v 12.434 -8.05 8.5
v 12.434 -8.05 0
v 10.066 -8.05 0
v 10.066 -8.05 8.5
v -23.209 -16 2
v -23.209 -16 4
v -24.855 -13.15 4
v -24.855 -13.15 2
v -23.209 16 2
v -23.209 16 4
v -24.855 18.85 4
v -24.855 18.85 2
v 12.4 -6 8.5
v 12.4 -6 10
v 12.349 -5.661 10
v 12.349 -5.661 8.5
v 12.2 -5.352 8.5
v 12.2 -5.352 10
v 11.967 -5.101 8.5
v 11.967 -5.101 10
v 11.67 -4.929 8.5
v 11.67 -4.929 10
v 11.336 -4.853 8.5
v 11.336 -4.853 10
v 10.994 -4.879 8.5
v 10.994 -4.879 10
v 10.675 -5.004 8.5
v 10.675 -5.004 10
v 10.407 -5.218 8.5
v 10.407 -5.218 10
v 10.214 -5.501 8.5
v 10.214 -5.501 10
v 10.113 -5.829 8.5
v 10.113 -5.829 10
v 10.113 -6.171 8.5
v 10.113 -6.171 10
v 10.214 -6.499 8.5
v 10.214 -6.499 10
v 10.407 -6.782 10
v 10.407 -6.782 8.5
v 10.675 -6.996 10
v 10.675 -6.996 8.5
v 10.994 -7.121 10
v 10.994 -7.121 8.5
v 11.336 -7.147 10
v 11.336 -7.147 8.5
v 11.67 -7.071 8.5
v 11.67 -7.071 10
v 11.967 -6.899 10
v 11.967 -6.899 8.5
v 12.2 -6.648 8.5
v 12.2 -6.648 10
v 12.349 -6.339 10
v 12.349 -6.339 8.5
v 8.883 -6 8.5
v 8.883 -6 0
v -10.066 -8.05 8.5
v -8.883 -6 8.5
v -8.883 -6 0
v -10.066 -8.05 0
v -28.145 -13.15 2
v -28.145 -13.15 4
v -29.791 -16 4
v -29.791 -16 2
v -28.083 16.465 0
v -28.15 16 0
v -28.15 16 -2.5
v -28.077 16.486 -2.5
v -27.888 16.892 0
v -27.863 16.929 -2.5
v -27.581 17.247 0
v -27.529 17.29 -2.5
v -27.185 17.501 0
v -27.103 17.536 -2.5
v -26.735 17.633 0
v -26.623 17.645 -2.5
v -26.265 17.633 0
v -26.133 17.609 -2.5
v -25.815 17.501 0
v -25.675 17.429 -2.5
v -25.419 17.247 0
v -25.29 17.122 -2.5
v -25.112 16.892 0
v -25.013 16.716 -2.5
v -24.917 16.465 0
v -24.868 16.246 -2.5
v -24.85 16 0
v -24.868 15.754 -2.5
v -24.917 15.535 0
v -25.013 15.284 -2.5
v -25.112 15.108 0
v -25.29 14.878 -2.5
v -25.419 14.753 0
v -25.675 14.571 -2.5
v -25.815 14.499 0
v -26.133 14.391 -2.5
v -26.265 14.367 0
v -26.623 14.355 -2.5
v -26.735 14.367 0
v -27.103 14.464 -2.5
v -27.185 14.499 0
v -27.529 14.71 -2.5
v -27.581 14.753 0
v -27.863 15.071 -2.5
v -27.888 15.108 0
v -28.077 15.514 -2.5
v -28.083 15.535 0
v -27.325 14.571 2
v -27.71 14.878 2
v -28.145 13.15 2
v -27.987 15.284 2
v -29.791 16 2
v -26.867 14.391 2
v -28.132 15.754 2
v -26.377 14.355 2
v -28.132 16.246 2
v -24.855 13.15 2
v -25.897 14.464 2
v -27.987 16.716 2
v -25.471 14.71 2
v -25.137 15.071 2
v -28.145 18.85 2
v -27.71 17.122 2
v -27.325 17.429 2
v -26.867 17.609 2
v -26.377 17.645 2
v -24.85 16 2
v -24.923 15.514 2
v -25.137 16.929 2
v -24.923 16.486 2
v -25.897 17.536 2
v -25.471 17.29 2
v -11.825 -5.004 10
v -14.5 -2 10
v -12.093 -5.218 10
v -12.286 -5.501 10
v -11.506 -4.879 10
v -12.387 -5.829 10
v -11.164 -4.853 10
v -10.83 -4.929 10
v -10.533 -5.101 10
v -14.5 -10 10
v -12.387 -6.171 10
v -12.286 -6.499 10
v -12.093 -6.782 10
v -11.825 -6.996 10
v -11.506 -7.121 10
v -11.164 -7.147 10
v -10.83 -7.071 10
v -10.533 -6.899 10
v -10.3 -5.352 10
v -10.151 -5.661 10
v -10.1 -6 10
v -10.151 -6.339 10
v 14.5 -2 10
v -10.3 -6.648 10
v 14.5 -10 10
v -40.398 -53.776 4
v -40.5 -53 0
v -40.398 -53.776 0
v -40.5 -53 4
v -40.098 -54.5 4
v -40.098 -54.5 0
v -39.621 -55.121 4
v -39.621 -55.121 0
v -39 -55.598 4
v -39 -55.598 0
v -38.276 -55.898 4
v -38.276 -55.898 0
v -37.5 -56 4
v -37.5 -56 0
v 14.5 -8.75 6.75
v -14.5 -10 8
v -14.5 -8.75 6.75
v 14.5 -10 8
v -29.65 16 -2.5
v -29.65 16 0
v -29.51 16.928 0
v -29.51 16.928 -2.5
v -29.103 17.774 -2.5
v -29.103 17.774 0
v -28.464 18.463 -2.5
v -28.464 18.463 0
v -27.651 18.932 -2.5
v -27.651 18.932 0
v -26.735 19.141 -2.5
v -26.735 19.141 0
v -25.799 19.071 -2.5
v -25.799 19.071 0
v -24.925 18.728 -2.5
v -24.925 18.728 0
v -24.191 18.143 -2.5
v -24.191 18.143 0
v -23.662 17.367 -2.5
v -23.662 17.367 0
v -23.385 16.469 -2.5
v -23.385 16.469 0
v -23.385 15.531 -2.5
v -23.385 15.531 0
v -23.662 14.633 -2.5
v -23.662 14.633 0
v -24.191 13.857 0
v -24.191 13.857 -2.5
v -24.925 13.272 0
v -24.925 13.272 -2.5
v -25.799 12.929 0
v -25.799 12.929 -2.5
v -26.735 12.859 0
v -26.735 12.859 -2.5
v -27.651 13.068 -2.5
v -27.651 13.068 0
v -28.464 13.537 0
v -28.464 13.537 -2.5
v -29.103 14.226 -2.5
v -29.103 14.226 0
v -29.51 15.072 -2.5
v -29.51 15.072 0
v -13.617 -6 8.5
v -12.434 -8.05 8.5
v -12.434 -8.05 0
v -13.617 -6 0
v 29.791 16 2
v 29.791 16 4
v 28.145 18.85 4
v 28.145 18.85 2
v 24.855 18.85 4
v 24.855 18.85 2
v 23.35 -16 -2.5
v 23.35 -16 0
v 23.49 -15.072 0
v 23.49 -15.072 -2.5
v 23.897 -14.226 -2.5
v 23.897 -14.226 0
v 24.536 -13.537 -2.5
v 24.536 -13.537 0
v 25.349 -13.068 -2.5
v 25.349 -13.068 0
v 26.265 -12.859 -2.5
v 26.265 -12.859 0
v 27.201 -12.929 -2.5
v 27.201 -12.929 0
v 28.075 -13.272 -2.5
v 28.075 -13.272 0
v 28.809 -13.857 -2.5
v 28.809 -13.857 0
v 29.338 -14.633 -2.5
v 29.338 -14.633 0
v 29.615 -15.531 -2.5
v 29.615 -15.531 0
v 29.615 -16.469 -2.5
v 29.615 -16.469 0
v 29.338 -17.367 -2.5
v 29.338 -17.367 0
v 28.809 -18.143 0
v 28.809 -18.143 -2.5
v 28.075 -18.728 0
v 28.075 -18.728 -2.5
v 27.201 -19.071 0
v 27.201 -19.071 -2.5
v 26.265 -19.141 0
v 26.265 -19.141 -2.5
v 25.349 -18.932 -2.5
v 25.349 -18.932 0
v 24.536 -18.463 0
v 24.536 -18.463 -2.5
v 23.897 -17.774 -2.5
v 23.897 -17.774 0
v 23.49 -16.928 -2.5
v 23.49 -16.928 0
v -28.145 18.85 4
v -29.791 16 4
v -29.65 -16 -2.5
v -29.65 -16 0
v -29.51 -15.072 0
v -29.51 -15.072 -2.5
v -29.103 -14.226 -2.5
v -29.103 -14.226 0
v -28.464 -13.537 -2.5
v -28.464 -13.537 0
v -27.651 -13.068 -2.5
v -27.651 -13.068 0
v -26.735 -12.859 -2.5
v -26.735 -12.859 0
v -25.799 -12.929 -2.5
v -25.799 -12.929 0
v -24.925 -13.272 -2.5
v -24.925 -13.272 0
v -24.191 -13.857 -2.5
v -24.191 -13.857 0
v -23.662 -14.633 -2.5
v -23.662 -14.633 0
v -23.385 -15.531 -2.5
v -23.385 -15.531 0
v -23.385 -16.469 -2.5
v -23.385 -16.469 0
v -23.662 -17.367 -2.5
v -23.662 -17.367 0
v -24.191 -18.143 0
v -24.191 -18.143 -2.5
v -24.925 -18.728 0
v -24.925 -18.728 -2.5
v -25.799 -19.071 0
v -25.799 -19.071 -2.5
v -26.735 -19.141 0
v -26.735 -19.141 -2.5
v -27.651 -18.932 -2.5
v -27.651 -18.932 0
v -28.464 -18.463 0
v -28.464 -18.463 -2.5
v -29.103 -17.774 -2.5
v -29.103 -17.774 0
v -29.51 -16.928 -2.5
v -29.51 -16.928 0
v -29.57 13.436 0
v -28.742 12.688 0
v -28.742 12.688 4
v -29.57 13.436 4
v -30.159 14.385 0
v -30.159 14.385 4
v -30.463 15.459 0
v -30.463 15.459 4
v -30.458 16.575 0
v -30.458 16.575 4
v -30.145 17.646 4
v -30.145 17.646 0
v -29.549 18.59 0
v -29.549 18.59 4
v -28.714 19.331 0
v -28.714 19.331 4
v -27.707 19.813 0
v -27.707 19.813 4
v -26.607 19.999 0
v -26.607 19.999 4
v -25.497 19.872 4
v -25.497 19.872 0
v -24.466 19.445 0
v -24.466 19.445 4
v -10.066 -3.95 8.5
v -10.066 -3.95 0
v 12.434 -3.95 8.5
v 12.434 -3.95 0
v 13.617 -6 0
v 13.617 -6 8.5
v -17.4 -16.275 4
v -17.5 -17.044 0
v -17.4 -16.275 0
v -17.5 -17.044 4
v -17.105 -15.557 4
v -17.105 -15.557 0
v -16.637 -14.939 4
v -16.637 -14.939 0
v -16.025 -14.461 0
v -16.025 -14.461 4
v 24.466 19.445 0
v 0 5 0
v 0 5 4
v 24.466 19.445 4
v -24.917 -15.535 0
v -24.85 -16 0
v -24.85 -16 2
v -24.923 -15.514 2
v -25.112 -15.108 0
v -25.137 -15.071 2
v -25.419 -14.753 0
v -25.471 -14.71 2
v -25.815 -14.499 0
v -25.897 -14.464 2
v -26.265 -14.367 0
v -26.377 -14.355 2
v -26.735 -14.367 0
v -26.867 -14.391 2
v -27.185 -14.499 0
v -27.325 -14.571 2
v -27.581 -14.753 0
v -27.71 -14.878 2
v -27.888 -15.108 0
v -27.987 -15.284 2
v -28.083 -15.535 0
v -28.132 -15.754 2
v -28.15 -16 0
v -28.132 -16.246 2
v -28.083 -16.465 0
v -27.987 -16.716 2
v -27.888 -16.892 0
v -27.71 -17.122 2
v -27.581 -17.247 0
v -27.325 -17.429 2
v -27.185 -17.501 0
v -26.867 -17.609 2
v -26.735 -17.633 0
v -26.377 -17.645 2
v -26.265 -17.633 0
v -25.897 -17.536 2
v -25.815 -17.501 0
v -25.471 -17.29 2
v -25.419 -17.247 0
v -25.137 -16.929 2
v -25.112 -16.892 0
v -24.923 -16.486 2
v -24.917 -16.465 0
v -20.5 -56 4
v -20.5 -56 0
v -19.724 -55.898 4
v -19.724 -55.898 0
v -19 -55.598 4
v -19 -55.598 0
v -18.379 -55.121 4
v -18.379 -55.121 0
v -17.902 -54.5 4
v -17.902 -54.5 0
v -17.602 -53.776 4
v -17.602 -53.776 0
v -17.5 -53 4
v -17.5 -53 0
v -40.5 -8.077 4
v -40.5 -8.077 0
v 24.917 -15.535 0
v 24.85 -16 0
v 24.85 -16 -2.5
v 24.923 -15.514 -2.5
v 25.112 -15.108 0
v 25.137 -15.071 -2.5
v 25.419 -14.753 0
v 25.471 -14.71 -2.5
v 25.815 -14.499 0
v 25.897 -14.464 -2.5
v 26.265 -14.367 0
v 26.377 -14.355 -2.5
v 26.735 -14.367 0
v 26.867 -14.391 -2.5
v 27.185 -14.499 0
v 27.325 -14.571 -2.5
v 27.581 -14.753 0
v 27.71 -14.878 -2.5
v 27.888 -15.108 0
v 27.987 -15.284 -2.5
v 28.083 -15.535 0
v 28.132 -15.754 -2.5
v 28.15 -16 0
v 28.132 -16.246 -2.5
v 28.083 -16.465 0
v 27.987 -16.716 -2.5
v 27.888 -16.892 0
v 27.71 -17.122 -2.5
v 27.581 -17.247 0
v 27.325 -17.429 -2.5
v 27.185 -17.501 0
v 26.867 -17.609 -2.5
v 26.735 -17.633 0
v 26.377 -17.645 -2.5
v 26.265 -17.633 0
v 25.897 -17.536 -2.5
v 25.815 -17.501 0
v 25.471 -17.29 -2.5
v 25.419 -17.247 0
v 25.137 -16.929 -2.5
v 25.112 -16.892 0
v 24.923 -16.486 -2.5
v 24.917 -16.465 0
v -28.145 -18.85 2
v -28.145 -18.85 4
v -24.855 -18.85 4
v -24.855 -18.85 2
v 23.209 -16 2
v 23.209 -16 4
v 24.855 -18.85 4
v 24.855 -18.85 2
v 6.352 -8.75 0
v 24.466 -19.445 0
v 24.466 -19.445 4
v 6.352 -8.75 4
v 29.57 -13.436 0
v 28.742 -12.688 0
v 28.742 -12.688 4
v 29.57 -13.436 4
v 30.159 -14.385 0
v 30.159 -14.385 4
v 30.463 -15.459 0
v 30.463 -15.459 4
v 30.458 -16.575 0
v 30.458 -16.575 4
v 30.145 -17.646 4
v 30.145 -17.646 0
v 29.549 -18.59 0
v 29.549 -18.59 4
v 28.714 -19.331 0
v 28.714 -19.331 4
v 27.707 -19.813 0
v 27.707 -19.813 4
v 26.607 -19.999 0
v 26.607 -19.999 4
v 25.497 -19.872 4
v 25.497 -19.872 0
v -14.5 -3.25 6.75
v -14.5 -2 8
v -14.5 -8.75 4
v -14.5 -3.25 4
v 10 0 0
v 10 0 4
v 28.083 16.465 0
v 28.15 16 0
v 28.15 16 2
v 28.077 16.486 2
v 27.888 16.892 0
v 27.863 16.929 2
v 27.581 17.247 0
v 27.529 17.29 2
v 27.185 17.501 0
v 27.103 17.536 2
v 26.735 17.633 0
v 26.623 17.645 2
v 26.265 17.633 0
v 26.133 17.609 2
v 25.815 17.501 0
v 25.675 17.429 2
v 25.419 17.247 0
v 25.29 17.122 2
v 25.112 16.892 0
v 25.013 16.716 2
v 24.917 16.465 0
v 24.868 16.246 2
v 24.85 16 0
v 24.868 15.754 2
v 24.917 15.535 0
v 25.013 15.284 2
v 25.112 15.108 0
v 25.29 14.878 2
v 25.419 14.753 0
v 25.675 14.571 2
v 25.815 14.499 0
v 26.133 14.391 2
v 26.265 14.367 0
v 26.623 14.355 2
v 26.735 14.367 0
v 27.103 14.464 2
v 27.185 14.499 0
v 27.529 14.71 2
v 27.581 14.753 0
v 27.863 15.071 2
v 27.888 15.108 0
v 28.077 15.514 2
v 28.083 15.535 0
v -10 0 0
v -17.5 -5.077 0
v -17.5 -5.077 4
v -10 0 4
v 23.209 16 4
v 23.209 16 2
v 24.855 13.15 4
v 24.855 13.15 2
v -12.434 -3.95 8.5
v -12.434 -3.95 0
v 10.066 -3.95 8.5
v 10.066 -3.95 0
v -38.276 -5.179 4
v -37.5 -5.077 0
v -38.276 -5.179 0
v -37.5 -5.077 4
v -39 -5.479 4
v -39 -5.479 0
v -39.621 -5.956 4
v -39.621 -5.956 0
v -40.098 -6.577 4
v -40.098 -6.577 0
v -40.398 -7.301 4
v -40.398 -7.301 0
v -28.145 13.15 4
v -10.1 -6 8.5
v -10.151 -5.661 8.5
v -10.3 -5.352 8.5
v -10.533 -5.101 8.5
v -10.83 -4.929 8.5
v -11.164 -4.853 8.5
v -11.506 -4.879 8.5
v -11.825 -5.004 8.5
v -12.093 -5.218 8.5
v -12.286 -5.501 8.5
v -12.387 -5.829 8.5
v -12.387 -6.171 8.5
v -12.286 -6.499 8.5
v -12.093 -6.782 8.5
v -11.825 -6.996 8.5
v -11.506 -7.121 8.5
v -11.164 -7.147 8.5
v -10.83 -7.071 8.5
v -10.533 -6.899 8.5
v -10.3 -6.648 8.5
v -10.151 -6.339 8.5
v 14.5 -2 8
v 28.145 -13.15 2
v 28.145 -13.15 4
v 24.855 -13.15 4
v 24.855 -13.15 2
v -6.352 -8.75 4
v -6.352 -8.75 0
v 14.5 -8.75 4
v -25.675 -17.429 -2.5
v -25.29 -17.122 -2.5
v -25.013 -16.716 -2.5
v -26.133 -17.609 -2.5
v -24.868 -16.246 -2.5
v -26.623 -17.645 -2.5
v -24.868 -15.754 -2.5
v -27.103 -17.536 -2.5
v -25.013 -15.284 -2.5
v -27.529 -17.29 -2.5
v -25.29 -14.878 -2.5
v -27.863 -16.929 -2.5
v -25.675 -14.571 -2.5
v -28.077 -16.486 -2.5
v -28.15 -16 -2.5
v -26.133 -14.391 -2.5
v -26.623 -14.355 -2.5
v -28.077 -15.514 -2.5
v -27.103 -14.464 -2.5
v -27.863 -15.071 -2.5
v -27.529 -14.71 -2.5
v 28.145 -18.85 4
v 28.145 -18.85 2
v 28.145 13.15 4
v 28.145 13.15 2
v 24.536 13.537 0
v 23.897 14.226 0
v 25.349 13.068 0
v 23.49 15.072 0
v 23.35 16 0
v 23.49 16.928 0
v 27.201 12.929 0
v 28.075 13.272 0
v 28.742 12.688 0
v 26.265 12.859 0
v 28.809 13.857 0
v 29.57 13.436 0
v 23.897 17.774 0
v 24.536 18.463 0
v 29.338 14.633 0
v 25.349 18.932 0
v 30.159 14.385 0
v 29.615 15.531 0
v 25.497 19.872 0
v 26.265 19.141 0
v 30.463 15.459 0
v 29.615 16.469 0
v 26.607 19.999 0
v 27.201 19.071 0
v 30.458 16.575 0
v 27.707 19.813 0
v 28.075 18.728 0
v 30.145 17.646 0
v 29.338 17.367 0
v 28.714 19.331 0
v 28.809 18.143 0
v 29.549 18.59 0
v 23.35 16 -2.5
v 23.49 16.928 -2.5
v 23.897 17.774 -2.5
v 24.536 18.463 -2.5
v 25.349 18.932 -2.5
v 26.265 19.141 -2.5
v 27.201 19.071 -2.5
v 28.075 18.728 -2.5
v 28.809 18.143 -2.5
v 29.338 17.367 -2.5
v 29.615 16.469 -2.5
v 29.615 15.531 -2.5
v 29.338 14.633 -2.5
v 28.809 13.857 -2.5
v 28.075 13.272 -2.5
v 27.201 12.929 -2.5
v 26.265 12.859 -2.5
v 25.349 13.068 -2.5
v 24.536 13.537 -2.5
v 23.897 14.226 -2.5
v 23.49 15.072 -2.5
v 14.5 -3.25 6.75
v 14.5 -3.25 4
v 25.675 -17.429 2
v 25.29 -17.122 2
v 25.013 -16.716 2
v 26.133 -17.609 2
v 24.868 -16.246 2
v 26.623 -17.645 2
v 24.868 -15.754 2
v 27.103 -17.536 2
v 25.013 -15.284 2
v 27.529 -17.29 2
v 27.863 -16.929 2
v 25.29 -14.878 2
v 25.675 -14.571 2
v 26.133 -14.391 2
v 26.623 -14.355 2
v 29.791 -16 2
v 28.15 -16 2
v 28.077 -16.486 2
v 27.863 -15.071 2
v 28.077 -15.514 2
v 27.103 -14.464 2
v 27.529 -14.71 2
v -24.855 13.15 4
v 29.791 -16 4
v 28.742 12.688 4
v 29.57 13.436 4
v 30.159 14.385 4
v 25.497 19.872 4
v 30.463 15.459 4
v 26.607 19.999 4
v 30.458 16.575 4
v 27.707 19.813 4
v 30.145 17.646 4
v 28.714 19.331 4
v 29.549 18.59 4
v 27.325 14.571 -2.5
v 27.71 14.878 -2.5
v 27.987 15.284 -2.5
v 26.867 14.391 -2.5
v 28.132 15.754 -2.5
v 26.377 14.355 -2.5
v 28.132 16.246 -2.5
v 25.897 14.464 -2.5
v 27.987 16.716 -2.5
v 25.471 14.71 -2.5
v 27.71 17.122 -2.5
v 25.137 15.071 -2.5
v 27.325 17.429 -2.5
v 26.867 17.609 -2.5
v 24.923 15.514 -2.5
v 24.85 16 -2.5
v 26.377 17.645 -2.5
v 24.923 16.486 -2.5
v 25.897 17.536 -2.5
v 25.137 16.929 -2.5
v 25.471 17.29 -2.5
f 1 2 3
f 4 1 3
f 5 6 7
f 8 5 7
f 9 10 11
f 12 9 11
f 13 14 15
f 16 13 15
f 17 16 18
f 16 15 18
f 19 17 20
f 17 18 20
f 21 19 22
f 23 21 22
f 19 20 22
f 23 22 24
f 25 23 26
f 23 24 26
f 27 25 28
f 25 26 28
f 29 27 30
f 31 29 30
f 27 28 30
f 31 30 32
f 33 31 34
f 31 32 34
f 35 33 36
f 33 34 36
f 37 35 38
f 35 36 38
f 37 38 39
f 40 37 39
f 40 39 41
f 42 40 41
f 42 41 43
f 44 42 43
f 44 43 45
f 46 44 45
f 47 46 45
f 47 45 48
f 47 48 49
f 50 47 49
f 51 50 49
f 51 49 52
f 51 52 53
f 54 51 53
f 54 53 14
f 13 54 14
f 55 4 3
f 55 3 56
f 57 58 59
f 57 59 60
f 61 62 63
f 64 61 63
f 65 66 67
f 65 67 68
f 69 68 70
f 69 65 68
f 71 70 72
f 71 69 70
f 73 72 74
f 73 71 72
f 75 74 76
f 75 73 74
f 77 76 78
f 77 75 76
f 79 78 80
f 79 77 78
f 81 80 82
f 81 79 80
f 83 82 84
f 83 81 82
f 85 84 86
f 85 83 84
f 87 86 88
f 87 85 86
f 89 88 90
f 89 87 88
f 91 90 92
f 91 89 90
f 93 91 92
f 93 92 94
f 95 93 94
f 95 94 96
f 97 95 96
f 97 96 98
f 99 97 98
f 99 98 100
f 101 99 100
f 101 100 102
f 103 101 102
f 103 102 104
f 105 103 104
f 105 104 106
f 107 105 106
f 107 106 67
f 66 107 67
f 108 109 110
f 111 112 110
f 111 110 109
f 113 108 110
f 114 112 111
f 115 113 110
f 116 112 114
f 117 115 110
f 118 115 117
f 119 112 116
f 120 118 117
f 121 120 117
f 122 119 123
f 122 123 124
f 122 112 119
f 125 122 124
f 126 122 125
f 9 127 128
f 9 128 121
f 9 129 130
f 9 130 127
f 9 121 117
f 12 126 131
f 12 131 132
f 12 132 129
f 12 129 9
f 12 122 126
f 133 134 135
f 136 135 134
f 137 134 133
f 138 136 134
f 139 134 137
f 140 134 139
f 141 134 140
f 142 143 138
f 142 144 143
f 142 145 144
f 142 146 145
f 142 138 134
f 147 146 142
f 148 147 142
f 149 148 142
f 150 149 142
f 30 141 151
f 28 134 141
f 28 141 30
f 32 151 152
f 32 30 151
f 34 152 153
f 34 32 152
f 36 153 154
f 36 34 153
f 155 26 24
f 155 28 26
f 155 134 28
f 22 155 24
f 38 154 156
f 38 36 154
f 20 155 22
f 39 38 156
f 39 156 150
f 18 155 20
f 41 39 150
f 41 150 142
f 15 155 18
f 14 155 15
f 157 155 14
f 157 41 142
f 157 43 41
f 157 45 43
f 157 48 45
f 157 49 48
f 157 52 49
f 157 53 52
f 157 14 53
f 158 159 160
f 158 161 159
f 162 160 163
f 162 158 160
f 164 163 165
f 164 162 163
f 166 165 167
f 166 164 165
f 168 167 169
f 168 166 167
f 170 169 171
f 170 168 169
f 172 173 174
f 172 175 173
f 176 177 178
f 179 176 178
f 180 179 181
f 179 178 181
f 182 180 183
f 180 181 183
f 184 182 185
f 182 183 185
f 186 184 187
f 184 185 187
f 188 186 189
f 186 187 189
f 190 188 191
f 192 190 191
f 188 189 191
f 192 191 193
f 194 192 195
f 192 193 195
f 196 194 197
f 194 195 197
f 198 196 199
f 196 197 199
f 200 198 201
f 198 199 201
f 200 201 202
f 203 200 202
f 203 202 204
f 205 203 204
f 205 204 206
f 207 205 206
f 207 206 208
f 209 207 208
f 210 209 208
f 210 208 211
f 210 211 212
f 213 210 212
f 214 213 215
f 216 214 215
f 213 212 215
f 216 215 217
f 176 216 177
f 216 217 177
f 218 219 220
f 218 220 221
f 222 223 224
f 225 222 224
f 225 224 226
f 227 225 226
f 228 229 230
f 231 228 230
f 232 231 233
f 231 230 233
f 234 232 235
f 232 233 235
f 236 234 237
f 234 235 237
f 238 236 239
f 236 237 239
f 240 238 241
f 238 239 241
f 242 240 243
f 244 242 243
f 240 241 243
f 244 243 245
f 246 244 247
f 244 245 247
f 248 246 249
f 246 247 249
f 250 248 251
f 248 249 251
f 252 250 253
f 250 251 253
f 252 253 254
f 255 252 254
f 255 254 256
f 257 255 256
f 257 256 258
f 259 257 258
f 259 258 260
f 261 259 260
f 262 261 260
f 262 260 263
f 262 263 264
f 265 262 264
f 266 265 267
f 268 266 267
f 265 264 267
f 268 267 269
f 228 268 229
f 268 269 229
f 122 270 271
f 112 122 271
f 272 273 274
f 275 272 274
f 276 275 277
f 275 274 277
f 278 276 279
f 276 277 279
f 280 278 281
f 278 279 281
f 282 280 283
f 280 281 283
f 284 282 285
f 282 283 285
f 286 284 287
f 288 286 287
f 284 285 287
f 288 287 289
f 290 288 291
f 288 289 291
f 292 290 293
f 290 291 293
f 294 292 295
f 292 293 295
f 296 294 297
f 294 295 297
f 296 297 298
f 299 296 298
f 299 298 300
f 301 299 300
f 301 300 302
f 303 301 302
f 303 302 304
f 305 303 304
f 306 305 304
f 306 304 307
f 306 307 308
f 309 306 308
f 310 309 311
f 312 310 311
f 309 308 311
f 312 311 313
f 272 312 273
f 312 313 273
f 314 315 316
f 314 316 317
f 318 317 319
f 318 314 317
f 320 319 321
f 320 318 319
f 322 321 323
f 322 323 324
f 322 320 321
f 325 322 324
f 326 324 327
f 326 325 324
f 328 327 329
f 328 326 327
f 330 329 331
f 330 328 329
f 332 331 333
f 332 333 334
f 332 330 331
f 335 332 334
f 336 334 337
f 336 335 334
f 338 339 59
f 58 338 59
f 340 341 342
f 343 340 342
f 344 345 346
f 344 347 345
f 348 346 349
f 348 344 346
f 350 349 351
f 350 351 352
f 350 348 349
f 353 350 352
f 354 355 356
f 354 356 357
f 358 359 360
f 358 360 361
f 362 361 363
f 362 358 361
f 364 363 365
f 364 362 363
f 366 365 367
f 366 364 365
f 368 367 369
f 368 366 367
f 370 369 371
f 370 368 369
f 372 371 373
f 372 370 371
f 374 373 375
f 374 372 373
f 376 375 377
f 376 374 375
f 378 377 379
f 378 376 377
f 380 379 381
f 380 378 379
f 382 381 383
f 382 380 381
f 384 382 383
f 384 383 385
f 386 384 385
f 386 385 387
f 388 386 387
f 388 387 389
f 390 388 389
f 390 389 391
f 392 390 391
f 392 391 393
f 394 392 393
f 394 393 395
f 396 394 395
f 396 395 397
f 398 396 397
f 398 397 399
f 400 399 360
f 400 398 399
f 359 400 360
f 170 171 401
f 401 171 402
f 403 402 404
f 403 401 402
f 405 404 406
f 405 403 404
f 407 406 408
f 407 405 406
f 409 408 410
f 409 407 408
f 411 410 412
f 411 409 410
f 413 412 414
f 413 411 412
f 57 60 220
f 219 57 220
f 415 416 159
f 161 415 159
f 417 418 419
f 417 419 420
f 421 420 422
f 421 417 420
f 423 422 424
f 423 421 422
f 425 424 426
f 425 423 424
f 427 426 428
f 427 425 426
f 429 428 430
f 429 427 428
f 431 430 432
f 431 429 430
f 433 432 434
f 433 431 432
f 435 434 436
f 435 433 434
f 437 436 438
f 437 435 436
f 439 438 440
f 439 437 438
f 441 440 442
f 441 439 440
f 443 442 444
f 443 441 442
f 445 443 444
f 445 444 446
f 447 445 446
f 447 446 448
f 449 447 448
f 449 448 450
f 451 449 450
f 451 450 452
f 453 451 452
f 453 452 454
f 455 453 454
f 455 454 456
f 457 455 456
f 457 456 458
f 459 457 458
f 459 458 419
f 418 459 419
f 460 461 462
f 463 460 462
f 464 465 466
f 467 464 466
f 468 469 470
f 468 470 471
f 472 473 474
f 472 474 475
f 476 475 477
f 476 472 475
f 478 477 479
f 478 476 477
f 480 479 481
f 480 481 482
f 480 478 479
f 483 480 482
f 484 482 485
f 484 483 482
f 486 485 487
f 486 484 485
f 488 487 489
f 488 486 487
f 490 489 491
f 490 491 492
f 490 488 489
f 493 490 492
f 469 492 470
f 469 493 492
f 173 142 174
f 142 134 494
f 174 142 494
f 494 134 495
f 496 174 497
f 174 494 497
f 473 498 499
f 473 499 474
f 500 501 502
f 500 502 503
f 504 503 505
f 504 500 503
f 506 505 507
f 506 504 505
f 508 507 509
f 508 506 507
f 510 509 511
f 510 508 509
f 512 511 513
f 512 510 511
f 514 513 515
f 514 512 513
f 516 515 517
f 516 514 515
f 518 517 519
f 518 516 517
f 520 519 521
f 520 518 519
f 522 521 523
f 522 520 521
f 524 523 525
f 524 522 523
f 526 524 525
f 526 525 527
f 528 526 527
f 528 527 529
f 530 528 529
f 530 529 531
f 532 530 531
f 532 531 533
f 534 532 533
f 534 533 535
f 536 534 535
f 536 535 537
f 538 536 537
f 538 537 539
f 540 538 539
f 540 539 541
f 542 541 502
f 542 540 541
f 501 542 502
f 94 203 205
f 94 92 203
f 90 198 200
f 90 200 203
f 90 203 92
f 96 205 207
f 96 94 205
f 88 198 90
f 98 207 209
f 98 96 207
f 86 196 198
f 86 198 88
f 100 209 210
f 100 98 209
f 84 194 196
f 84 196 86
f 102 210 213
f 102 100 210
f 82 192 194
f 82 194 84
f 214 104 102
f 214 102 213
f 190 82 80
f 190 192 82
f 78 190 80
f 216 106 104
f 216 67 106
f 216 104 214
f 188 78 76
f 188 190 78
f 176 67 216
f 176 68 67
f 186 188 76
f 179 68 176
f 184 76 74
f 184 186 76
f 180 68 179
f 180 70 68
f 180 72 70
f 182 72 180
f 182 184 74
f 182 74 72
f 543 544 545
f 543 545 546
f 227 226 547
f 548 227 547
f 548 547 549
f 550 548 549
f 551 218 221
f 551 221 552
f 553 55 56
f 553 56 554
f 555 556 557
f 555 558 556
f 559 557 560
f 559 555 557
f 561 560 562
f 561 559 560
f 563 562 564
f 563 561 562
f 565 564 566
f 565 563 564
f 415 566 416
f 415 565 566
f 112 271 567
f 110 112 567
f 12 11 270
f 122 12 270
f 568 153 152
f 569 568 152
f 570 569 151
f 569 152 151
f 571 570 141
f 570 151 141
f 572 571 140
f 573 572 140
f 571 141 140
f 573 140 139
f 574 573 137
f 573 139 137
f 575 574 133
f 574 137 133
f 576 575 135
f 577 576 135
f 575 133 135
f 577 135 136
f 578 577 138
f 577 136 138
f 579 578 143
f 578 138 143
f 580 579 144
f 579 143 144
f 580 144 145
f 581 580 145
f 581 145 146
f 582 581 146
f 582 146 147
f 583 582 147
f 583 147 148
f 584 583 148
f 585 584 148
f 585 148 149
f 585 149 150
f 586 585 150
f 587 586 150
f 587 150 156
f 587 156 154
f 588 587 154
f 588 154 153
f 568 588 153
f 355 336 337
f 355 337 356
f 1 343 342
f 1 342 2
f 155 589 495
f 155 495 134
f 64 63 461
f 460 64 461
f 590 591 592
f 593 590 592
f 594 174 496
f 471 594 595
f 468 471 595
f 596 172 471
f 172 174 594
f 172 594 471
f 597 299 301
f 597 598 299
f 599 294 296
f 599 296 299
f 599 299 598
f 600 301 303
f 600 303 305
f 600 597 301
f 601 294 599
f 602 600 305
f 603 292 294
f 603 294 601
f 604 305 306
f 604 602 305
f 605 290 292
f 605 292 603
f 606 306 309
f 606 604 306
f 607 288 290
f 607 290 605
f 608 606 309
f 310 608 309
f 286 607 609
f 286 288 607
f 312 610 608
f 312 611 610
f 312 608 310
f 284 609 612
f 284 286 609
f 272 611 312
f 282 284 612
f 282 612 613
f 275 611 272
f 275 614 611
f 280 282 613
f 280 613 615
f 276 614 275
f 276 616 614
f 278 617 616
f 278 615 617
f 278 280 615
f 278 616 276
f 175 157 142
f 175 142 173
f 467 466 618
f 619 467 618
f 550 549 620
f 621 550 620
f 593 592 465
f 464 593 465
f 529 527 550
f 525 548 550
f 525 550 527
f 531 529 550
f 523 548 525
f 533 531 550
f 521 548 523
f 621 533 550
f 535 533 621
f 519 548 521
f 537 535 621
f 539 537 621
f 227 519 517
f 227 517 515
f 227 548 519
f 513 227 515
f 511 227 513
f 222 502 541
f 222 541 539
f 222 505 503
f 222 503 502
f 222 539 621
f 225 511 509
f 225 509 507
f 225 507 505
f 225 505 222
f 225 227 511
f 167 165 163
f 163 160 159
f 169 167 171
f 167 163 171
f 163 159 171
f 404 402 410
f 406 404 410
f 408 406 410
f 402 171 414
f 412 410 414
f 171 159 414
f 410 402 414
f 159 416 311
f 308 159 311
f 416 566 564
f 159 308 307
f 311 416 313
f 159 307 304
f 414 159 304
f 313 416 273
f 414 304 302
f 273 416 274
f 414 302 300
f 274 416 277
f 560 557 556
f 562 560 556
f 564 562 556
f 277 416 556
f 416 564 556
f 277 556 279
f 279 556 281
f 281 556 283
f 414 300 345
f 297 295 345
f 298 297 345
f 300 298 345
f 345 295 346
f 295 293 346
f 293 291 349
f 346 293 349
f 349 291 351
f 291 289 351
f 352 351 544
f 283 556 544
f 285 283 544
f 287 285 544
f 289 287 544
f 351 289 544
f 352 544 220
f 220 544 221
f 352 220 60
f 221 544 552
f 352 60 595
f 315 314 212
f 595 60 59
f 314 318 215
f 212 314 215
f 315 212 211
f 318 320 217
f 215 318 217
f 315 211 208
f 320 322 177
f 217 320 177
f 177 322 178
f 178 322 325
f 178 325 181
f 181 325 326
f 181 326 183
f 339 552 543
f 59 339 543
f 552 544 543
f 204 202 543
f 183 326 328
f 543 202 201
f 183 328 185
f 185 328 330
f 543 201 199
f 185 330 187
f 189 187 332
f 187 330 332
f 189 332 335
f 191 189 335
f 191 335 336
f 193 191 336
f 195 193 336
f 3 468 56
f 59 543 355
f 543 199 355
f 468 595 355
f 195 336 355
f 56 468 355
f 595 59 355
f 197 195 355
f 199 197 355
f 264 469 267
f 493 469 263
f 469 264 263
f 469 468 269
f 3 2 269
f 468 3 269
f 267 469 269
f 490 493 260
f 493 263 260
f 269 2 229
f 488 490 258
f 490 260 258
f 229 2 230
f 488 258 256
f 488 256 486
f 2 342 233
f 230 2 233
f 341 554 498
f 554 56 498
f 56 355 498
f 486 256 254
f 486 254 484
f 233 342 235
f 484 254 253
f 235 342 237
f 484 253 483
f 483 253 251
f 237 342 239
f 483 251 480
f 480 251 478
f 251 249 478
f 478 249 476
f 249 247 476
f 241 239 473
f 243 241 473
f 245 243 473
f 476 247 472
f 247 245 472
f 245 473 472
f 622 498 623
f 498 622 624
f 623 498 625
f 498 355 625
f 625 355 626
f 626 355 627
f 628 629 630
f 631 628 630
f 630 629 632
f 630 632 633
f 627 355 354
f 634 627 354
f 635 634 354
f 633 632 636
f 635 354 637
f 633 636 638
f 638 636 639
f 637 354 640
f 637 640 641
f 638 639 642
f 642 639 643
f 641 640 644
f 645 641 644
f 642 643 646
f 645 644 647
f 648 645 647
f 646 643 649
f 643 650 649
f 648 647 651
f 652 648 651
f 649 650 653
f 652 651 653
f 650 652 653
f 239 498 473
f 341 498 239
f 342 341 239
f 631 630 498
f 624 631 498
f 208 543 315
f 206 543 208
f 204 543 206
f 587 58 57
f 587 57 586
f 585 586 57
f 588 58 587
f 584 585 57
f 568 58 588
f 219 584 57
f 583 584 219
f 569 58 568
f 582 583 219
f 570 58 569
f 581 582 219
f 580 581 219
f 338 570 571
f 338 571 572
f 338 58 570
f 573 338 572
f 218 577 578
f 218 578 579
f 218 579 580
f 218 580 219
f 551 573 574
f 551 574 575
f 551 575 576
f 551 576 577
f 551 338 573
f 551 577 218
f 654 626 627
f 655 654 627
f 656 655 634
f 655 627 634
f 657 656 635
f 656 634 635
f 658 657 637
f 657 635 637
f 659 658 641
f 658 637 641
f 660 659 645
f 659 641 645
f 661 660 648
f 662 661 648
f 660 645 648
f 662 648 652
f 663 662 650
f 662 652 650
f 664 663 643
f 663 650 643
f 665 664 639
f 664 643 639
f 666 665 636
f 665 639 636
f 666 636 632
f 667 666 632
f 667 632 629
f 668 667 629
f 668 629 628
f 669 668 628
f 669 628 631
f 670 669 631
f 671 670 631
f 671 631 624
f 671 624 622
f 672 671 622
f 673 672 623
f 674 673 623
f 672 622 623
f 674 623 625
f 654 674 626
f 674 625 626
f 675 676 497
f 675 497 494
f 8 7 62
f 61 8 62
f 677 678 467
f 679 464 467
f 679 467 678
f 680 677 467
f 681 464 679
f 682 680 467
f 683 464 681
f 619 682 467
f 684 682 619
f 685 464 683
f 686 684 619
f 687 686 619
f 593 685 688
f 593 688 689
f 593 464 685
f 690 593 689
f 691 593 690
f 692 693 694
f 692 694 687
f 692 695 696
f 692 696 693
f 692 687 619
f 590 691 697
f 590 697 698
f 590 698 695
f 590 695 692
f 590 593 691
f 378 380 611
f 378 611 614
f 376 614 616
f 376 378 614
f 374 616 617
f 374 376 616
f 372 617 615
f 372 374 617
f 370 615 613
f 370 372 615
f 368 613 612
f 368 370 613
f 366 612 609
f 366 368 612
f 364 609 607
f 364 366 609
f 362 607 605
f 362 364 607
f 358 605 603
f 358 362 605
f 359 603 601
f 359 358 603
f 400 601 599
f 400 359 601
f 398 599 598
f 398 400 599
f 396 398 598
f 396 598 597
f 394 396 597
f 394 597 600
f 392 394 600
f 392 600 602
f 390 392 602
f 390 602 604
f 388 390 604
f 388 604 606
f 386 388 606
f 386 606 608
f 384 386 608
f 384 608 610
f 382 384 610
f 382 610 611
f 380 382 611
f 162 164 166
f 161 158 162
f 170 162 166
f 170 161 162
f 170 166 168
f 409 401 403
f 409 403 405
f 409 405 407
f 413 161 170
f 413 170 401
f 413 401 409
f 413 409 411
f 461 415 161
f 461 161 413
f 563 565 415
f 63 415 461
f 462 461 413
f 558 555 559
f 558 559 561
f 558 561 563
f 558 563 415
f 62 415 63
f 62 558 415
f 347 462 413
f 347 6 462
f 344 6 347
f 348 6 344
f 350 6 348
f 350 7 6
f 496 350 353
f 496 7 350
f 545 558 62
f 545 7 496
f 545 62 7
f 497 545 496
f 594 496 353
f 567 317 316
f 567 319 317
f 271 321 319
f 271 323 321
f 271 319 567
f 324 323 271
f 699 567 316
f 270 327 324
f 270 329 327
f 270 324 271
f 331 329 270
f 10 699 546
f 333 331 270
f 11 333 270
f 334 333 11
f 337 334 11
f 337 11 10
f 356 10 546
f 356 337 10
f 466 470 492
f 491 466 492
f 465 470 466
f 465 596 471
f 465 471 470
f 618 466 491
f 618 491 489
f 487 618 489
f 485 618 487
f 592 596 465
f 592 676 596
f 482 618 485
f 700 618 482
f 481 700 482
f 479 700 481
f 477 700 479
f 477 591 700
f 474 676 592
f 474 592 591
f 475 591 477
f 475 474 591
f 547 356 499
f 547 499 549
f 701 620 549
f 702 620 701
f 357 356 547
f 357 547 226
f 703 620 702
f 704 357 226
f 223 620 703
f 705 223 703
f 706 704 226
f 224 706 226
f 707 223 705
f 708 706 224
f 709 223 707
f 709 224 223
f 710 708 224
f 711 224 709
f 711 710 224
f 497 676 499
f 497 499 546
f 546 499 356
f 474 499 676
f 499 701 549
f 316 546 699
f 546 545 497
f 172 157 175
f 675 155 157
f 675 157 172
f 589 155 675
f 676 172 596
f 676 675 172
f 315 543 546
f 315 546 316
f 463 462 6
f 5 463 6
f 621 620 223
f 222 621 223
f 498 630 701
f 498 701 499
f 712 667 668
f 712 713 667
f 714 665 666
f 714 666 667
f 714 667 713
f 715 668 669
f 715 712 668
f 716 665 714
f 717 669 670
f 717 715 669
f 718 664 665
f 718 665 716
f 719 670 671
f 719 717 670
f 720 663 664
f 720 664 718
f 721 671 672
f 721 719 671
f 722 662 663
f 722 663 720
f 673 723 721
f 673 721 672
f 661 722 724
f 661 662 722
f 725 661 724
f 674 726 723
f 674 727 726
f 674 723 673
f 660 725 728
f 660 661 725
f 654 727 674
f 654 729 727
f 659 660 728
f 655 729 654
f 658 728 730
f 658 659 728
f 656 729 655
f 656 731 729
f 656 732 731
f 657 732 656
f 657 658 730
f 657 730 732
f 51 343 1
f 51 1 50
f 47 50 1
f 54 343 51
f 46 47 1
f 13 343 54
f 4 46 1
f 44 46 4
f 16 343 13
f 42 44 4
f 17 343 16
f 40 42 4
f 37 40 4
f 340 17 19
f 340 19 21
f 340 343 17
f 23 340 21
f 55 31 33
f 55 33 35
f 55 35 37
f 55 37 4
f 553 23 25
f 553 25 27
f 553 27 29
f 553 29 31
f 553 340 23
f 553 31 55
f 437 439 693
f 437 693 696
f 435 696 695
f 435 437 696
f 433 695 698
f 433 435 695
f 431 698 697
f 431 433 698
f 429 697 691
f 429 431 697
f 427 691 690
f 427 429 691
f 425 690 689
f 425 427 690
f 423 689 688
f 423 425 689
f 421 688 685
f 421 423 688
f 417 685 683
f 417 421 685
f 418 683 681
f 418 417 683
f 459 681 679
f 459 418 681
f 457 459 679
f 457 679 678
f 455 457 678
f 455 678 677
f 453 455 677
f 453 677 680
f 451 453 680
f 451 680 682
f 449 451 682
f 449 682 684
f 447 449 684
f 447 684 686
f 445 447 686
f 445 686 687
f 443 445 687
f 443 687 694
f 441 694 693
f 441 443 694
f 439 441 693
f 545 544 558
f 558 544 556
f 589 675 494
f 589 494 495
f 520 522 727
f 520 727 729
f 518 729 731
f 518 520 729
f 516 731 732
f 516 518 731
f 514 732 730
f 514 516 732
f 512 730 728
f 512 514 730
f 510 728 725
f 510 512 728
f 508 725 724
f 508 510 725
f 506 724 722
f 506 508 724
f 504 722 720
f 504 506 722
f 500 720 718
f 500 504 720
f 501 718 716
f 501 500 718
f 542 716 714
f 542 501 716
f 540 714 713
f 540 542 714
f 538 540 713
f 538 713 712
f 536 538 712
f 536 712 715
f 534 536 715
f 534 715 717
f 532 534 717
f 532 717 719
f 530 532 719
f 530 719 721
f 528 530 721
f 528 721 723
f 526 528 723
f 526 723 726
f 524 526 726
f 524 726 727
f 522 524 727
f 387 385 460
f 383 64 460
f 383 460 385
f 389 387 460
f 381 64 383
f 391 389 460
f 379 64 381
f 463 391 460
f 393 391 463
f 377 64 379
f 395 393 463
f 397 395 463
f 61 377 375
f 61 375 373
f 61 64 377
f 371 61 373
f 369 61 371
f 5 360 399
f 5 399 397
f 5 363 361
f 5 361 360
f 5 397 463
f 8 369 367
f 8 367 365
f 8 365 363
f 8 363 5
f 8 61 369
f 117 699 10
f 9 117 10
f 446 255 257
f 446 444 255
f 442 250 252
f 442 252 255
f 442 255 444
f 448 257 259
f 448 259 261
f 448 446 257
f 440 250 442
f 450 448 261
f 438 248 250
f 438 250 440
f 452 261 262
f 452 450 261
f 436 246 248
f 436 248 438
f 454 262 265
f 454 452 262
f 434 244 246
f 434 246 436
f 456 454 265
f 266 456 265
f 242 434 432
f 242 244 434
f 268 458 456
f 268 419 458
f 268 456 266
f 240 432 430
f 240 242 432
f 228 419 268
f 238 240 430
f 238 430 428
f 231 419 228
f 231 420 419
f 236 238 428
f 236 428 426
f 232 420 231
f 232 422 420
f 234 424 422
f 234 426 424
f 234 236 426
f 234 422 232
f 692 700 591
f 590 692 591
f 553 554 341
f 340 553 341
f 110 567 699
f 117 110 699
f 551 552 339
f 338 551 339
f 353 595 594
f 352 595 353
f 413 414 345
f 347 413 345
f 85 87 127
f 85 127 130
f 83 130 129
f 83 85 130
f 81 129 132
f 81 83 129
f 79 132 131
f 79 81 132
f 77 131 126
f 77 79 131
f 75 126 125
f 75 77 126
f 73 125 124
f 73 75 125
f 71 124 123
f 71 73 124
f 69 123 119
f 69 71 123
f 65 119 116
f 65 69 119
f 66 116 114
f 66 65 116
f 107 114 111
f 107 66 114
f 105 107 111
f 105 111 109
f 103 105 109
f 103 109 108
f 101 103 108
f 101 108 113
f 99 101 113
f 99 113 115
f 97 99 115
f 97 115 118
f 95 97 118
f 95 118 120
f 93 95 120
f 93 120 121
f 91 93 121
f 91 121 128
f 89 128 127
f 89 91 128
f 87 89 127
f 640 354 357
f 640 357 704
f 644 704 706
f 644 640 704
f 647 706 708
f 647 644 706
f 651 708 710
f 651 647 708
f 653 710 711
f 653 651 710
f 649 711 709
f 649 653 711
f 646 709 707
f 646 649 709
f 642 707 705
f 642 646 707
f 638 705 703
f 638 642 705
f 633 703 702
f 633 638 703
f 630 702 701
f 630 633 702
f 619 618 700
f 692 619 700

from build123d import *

# Parameters (mm, degrees)
SKETCH_1_R          = 1.65
EXTRUDE_1_DEPTH     = 4
CUT_EXTRUDE_1_DEPTH = 2
SKETCH_5_R          = 3.15
SKETCH_5_R_2        = 1.65
EXTRUDE_3_DEPTH     = 2.5
EXTRUDE_2_DEPTH     = 14.5
SKETCH_4_R          = 1.15
CUT_EXTRUDE_2_DEPTH = 13.5
CUT_EXTRUDE_3_DEPTH = 8.5
EXTRUDE_4_DEPTH     = 4
FILLET_1_R          = 3


with BuildPart() as part:
    # 草图1 → 凸台-拉伸1 (new body)
    with BuildSketch(Plane.XY):
        with BuildLine():
            Line((-24.466432563, 19.444503372), (0, 5))
            Line((0, 5), (24.466432563, 19.444503372))
            ThreePointArc((24.466432563, 19.444503372), (29.880062562, 18.138966358), (28.742325032, 12.687602311))
            Line((28.742325032, 12.687602311), (10, 0))
            Line((10, 0), (28.742325032, -12.687602311))
            ThreePointArc((28.742325032, -12.687602311), (29.880062562, -18.138966358), (24.466432563, -19.444503372))
            Line((24.466432563, -19.444503372), (0, -5))
            Line((0, -5), (-24.466432563, -19.444503372))
            ThreePointArc((-24.466432563, -19.444503372), (-29.880062562, -18.138966358), (-28.742325032, -12.687602311))
            Line((-28.742325032, -12.687602311), (-10, 0))
            Line((-10, 0), (-28.742325032, 12.687602311))
            ThreePointArc((-28.742325032, 12.687602311), (-29.880062562, 18.138966358), (-24.466432563, 19.444503372))
        make_face()
        with Locations((-26.5, 16)):
            Circle(SKETCH_1_R, mode=Mode.SUBTRACT)
        with Locations((26.5, 16)):
            Circle(SKETCH_1_R, mode=Mode.SUBTRACT)
        with Locations((26.5, -16)):
            Circle(SKETCH_1_R, mode=Mode.SUBTRACT)
        with Locations((-26.5, -16)):
            Circle(SKETCH_1_R, mode=Mode.SUBTRACT)
    extrude(amount=EXTRUDE_1_DEPTH)

    # 草图2 → 切除-拉伸1 (cut)
    with BuildSketch(Plane.XY.offset(4)):
        Polygon((-24.854551733, 18.85), (-28.145448267, 18.85), (-29.790896534, 16), (-28.145448267, 13.15), (-24.854551733, 13.15), (-23.209103466, 16), align=None)
        Polygon((28.145448267, 18.85), (24.854551733, 18.85), (23.209103466, 16), (24.854551733, 13.15), (28.145448267, 13.15), (29.790896534, 16), align=None)
        Polygon((28.145448267, -13.15), (24.854551733, -13.15), (23.209103466, -16), (24.854551733, -18.85), (28.145448267, -18.85), (29.790896534, -16), align=None)
        Polygon((-24.854551733, -13.15), (-28.145448267, -13.15), (-29.790896534, -16), (-28.145448267, -18.85), (-24.854551733, -18.85), (-23.209103466, -16), align=None)
    extrude(amount=-CUT_EXTRUDE_1_DEPTH, mode=Mode.SUBTRACT)

    # 草图5 → 凸台-拉伸3 (add)
    with BuildSketch(Plane(origin=(0, 0, 0), x_dir=(-1, 0, 0), z_dir=(0, 0, -1))):
        with Locations((26.5, 16)):
            Circle(SKETCH_5_R)
        with Locations((26.5, 16)):
            Circle(SKETCH_5_R_2, mode=Mode.SUBTRACT)
        with Locations((26.5, -16)):
            Circle(SKETCH_5_R)
        with Locations((26.5, -16)):
            Circle(SKETCH_5_R_2, mode=Mode.SUBTRACT)
        with Locations((-26.5, -16)):
            Circle(SKETCH_5_R)
        with Locations((-26.5, -16)):
            Circle(SKETCH_5_R_2, mode=Mode.SUBTRACT)
        with Locations((-26.5, 16)):
            Circle(SKETCH_5_R)
        with Locations((-26.5, 16)):
            Circle(SKETCH_5_R_2, mode=Mode.SUBTRACT)
    extrude(amount=EXTRUDE_3_DEPTH)

    # 草图3 → 凸台-拉伸2 (add, symmetric)
    with BuildSketch(Plane(origin=(0, 0, 0), x_dir=(0, 0, -1), z_dir=(1, 0, 0))):
        Polygon((0, -8.75), (0, -3.25), (-6.75, -3.25), (-8, -2), (-10, -2), (-10, -10), (-8, -10), (-6.75, -8.75), align=None)
    extrude(amount=EXTRUDE_2_DEPTH, both=True)

    # 草图4 → 切除-拉伸2 (cut, through all)
    with BuildSketch(Plane.XY.offset(10)):
        with Locations((-11.25, -6)):
            Circle(SKETCH_4_R)
        with Locations((11.25, -6)):
            Circle(SKETCH_4_R)
    extrude(amount=-CUT_EXTRUDE_2_DEPTH, mode=Mode.SUBTRACT)

    # 草图6 → 切除-拉伸3 (cut)
    with BuildSketch(Plane(origin=(0, 0, 0), x_dir=(-1, 0, 0), z_dir=(0, 0, -1))):
        Polygon((-10.066431948, -3.95), (-12.433568052, -3.95), (-13.617136104, -6), (-12.433568052, -8.05), (-10.066431948, -8.05), (-8.882863896, -6), align=None)
        Polygon((12.433568052, -3.95), (10.066431948, -3.95), (8.882863896, -6), (10.066431948, -8.05), (12.433568052, -8.05), (13.617136104, -6), align=None)
    extrude(amount=-CUT_EXTRUDE_3_DEPTH, mode=Mode.SUBTRACT)

    # 草图7 → 凸台-拉伸4 (add)
    with BuildSketch(Plane(origin=(0, 0, 0), x_dir=(-1, 0, 0), z_dir=(0, 0, -1))):
        with BuildLine():
            Line((17.5, -5.07711915), (40.5, -5.07711915))
            Line((40.5, -5.07711915), (40.5, -56))
            Line((40.5, -56), (17.5, -56))
            Line((17.5, -56), (17.5, -15.331657807))
            Line((17.5, -15.331657807), (24.466432563, -19.444503372))
            ThreePointArc((24.466432563, -19.444503372), (29.880062562, -18.138966358), (28.742325032, -12.687602311))
            Line((28.742325032, -12.687602311), (17.5, -5.07711915))
        make_face()
    extrude(amount=-EXTRUDE_4_DEPTH)

    # 圆角1
    fillet_1_edges = [part.edges().sort_by_distance(p)[0] for p in [
        (-40.5, -5.07711915, 2),
        (-40.5, -56, 2),
        (-17.5, -56, 2),
        (-17.5, -15.331657807, 2),
    ]]
    fillet(fillet_1_edges, radius=FILLET_1_R)


solid = part.part
